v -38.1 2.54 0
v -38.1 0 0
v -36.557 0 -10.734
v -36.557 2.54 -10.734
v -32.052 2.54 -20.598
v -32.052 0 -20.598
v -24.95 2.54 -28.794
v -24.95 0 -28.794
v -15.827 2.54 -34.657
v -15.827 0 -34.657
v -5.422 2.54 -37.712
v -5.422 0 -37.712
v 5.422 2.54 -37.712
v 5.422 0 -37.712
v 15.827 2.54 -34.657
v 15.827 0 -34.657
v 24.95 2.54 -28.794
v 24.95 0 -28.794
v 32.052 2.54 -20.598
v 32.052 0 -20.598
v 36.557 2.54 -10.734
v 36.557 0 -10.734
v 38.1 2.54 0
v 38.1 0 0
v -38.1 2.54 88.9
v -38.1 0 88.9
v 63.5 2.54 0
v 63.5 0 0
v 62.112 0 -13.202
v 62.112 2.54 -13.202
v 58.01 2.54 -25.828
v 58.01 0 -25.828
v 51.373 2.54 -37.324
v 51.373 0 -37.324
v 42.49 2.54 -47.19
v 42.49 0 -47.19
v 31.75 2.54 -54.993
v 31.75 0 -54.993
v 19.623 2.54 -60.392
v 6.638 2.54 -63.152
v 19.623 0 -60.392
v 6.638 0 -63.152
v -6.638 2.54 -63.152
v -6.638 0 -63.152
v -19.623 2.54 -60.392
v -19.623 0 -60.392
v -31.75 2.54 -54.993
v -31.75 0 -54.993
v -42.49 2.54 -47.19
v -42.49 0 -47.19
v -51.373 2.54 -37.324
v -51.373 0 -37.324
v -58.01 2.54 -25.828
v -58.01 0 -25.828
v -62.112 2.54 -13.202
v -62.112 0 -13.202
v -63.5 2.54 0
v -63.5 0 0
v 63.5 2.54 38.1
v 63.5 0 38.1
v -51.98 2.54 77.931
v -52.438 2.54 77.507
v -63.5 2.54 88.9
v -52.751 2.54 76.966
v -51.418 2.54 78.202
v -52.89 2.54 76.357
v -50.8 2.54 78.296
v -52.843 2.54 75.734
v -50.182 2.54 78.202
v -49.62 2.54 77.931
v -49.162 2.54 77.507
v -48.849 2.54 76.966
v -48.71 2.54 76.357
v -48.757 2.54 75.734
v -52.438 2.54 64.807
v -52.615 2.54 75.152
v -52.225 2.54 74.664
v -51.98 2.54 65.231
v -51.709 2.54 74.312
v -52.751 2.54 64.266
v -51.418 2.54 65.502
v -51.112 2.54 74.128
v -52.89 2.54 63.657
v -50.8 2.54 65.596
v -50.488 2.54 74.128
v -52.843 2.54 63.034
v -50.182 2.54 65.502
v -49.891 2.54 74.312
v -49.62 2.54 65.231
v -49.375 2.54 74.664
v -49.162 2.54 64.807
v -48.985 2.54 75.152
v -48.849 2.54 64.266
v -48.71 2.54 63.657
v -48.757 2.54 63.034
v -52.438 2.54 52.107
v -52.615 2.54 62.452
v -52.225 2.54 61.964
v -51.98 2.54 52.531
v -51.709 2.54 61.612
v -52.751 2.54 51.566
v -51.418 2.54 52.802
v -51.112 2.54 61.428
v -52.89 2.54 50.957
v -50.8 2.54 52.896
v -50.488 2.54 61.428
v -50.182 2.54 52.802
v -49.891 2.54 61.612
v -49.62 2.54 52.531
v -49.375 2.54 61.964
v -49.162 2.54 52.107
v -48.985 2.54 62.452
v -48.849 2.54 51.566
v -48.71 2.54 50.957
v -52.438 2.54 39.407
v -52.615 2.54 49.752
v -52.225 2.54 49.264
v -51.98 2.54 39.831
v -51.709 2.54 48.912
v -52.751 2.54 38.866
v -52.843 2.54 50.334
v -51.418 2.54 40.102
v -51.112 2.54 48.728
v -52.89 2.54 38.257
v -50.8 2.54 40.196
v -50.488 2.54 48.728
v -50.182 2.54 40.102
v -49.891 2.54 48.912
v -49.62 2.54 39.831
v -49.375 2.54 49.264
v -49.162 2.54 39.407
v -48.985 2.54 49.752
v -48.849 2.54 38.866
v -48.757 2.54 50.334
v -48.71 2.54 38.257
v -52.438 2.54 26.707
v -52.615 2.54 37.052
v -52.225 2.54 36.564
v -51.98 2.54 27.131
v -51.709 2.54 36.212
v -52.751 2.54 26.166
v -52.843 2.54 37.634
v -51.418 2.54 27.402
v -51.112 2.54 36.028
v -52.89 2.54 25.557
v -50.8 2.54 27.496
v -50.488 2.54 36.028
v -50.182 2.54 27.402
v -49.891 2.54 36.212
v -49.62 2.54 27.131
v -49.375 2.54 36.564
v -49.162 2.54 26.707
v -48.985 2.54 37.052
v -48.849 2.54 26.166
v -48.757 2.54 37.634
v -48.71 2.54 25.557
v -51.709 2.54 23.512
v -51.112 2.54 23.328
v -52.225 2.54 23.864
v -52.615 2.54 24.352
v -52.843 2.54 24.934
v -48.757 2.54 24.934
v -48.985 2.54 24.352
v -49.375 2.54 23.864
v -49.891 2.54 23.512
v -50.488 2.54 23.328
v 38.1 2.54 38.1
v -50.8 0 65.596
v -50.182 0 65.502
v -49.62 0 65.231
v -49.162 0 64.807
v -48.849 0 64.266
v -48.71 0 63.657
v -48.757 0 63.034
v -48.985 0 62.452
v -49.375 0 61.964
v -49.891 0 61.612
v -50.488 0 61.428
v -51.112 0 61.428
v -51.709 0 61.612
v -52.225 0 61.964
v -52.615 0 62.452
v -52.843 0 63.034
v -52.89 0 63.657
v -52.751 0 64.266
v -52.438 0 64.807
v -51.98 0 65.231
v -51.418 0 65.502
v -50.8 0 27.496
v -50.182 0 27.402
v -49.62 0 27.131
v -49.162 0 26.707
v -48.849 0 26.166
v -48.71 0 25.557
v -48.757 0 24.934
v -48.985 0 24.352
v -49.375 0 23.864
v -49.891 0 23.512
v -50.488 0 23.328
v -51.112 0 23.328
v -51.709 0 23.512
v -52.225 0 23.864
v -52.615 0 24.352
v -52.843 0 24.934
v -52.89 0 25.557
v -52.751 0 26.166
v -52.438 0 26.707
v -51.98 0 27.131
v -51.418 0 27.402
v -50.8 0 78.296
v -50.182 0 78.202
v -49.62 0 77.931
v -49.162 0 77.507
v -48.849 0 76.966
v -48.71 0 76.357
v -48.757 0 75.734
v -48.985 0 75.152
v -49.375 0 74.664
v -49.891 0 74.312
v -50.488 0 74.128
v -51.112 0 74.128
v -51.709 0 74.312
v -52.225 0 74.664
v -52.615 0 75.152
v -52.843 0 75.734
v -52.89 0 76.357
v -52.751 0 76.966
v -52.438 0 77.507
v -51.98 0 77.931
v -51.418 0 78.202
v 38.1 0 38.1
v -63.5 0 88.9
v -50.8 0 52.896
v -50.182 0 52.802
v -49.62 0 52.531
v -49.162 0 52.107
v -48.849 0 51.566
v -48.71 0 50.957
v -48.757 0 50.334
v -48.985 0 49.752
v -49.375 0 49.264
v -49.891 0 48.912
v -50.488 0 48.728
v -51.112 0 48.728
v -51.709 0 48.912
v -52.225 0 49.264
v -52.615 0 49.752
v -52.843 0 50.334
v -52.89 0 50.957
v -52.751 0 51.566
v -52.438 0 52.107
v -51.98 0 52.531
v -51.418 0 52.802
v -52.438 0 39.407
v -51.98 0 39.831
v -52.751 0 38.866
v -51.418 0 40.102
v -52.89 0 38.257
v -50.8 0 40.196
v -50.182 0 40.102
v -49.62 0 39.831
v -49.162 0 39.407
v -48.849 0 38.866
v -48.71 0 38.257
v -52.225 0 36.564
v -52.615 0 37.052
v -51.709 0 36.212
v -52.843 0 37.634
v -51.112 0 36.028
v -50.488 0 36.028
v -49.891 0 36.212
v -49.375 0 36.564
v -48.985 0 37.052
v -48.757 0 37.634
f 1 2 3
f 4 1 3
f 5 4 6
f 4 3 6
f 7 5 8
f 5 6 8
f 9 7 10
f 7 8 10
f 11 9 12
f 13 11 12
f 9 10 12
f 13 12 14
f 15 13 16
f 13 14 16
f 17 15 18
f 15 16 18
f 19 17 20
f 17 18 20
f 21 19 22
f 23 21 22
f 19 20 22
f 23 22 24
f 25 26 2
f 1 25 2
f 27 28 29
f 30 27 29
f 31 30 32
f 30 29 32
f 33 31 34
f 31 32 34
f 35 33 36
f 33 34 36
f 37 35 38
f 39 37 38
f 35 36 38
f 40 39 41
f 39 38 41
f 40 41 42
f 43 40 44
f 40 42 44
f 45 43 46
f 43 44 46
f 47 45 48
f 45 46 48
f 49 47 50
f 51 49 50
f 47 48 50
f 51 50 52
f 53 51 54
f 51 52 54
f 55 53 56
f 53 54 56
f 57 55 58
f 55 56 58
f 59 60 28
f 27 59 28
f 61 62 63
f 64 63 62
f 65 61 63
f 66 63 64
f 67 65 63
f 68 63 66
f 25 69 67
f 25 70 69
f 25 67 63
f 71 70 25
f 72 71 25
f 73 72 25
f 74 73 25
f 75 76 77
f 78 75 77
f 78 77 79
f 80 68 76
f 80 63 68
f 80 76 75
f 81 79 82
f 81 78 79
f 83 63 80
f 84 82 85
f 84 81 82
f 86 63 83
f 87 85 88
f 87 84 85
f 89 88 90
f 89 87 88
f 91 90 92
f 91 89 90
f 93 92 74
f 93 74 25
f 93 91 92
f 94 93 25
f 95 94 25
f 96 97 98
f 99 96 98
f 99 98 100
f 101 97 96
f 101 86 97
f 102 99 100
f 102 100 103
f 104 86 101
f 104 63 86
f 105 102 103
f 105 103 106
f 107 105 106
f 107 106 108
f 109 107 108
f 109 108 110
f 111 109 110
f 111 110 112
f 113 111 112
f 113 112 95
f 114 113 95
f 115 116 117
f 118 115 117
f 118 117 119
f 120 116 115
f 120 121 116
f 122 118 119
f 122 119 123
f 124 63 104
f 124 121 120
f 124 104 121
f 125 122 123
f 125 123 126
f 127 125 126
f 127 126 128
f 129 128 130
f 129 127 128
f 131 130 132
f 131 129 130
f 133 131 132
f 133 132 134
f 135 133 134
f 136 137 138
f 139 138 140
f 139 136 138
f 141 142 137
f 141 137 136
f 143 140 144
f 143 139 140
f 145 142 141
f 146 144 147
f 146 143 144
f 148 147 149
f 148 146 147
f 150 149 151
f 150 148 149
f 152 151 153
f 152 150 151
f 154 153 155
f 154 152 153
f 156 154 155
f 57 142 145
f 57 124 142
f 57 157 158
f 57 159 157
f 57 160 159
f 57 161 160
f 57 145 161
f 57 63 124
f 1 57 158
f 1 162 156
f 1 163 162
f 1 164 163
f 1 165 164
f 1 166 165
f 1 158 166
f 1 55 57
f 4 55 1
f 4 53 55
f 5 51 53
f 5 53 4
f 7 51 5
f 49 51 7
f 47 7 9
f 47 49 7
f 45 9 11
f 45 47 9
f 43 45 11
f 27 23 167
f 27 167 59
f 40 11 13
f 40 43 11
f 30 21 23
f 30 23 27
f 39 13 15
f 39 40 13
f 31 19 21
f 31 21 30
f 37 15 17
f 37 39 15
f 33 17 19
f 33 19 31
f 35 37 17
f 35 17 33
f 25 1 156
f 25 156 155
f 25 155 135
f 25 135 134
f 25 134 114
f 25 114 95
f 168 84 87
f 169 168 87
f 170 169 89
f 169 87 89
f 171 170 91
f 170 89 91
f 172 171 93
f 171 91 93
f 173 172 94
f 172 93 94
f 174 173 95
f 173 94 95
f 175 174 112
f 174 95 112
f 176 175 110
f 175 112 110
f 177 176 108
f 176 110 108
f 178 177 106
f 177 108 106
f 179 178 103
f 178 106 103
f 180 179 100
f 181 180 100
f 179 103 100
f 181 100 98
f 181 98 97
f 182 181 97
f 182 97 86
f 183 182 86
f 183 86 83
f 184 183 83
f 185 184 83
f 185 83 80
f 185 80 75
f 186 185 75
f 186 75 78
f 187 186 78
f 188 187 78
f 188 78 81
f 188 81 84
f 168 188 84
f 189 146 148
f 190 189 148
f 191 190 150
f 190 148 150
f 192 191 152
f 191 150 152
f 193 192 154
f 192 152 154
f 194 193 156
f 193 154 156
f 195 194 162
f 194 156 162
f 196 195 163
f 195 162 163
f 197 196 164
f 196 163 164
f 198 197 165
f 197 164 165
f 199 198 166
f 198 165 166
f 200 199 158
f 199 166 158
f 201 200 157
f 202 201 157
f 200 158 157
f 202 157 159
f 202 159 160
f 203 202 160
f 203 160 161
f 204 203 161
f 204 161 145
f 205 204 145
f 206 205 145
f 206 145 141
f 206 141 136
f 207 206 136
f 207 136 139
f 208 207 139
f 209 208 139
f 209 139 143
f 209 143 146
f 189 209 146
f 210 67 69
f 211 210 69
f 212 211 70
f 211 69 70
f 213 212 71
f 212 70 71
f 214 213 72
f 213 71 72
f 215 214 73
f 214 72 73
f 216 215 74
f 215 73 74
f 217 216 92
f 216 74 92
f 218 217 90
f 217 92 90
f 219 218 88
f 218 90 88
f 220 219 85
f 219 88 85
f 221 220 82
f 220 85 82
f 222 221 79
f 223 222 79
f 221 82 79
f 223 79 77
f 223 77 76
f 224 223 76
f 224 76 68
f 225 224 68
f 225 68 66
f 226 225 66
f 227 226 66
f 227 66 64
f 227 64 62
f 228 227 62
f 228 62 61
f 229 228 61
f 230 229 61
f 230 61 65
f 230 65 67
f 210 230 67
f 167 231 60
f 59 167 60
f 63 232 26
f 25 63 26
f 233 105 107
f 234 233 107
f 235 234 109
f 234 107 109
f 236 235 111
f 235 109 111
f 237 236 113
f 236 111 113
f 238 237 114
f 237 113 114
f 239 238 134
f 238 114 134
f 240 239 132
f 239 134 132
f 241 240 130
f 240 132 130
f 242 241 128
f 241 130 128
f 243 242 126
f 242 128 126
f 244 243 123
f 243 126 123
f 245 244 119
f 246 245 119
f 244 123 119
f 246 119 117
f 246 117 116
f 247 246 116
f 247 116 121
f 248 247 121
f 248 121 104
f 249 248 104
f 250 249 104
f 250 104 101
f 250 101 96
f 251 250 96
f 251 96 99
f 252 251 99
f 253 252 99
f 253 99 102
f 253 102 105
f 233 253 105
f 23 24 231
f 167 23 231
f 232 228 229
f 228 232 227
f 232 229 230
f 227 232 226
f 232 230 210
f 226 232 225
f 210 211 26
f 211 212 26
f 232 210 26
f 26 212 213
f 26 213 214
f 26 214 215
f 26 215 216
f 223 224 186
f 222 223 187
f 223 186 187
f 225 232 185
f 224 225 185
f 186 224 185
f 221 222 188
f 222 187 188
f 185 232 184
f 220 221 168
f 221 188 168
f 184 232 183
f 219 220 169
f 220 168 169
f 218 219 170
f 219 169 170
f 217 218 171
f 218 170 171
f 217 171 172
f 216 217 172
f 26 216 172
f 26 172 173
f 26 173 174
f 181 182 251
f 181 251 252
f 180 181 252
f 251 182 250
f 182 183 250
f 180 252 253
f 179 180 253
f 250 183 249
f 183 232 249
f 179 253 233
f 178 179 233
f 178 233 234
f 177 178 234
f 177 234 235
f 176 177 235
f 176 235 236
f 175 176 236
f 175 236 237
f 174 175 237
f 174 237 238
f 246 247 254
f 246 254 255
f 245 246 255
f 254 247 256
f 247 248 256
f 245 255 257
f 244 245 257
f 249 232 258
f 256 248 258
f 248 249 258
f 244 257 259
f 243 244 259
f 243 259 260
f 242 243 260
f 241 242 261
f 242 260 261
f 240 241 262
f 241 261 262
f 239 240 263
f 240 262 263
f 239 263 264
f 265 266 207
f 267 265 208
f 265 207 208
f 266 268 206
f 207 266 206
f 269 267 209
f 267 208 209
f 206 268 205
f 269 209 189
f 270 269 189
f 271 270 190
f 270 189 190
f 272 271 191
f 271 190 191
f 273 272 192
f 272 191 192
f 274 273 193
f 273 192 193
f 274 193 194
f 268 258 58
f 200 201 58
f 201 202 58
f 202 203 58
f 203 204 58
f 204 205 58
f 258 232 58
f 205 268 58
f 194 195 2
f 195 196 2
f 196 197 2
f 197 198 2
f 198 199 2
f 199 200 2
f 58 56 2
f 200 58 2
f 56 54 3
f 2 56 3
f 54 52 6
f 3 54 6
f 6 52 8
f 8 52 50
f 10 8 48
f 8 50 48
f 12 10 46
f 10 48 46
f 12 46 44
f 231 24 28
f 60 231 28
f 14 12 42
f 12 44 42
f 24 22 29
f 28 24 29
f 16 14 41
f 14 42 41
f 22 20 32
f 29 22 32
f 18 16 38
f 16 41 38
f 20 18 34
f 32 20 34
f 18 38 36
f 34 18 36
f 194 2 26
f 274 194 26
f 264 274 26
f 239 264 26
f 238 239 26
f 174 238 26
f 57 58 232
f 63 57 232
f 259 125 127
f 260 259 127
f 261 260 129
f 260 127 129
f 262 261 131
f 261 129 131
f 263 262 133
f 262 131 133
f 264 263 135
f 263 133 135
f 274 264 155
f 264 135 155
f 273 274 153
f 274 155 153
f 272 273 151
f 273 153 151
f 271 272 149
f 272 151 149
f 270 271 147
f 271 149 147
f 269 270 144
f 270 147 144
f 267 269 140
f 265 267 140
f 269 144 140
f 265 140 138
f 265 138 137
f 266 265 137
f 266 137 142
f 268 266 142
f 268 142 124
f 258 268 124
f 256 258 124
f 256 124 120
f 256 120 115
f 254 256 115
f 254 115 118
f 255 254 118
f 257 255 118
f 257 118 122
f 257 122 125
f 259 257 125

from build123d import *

# Parameters (mm, degrees)
BOSS_EXTRUDE1_DEPTH = 2.54
SKETCH2_R           = 2.0955
CUT_EXTRUDE1_DEPTH  = 110.279053803


with BuildPart() as part:
    # Sketch1 → Boss-Extrude1 (new body)
    with BuildSketch(Plane(origin=(0, 0, 0), x_dir=(1, 0, 0), z_dir=(0, 1, 0))):
        with BuildLine():
            Line((-38.1, -88.9), (-38.1, 0))
            ThreePointArc((-38.1, 0), (0, 38.1), (38.1, 0))
            Line((38.1, 0), (38.1, -38.1))
            Line((38.1, -38.1), (63.5, -38.1))
            Line((63.5, -38.1), (63.5, 0))
            ThreePointArc((63.5, 0), (0, 63.5), (-63.5, 0))
            Line((-63.5, 0), (-63.5, -88.9))
            Line((-63.5, -88.9), (-38.1, -88.9))
        make_face()
    extrude(amount=BOSS_EXTRUDE1_DEPTH)

    # Sketch2 → Cut-Extrude1 (cut, through all)
    with BuildSketch(Plane(origin=(0, 2.54, 0), x_dir=(1, 0, 0), z_dir=(0, 1, 0))):
        with Locations(Location((-50.8, -76.2, 0), (0, 0, 270))):
            Circle(SKETCH2_R)
        with Locations(Location((-50.8, -63.5, 0), (0, 0, 270))):
            Circle(SKETCH2_R)
        with Locations(Location((-50.8, -50.8, 0), (0, 0, 270))):
            Circle(SKETCH2_R)
        with Locations(Location((-50.8, -38.1, 0), (0, 0, 270))):
            Circle(SKETCH2_R)
        with Locations(Location((-50.8, -25.4, 0), (0, 0, 270))):
            Circle(SKETCH2_R)
    extrude(amount=-CUT_EXTRUDE1_DEPTH, mode=Mode.SUBTRACT)


solid = part.part
